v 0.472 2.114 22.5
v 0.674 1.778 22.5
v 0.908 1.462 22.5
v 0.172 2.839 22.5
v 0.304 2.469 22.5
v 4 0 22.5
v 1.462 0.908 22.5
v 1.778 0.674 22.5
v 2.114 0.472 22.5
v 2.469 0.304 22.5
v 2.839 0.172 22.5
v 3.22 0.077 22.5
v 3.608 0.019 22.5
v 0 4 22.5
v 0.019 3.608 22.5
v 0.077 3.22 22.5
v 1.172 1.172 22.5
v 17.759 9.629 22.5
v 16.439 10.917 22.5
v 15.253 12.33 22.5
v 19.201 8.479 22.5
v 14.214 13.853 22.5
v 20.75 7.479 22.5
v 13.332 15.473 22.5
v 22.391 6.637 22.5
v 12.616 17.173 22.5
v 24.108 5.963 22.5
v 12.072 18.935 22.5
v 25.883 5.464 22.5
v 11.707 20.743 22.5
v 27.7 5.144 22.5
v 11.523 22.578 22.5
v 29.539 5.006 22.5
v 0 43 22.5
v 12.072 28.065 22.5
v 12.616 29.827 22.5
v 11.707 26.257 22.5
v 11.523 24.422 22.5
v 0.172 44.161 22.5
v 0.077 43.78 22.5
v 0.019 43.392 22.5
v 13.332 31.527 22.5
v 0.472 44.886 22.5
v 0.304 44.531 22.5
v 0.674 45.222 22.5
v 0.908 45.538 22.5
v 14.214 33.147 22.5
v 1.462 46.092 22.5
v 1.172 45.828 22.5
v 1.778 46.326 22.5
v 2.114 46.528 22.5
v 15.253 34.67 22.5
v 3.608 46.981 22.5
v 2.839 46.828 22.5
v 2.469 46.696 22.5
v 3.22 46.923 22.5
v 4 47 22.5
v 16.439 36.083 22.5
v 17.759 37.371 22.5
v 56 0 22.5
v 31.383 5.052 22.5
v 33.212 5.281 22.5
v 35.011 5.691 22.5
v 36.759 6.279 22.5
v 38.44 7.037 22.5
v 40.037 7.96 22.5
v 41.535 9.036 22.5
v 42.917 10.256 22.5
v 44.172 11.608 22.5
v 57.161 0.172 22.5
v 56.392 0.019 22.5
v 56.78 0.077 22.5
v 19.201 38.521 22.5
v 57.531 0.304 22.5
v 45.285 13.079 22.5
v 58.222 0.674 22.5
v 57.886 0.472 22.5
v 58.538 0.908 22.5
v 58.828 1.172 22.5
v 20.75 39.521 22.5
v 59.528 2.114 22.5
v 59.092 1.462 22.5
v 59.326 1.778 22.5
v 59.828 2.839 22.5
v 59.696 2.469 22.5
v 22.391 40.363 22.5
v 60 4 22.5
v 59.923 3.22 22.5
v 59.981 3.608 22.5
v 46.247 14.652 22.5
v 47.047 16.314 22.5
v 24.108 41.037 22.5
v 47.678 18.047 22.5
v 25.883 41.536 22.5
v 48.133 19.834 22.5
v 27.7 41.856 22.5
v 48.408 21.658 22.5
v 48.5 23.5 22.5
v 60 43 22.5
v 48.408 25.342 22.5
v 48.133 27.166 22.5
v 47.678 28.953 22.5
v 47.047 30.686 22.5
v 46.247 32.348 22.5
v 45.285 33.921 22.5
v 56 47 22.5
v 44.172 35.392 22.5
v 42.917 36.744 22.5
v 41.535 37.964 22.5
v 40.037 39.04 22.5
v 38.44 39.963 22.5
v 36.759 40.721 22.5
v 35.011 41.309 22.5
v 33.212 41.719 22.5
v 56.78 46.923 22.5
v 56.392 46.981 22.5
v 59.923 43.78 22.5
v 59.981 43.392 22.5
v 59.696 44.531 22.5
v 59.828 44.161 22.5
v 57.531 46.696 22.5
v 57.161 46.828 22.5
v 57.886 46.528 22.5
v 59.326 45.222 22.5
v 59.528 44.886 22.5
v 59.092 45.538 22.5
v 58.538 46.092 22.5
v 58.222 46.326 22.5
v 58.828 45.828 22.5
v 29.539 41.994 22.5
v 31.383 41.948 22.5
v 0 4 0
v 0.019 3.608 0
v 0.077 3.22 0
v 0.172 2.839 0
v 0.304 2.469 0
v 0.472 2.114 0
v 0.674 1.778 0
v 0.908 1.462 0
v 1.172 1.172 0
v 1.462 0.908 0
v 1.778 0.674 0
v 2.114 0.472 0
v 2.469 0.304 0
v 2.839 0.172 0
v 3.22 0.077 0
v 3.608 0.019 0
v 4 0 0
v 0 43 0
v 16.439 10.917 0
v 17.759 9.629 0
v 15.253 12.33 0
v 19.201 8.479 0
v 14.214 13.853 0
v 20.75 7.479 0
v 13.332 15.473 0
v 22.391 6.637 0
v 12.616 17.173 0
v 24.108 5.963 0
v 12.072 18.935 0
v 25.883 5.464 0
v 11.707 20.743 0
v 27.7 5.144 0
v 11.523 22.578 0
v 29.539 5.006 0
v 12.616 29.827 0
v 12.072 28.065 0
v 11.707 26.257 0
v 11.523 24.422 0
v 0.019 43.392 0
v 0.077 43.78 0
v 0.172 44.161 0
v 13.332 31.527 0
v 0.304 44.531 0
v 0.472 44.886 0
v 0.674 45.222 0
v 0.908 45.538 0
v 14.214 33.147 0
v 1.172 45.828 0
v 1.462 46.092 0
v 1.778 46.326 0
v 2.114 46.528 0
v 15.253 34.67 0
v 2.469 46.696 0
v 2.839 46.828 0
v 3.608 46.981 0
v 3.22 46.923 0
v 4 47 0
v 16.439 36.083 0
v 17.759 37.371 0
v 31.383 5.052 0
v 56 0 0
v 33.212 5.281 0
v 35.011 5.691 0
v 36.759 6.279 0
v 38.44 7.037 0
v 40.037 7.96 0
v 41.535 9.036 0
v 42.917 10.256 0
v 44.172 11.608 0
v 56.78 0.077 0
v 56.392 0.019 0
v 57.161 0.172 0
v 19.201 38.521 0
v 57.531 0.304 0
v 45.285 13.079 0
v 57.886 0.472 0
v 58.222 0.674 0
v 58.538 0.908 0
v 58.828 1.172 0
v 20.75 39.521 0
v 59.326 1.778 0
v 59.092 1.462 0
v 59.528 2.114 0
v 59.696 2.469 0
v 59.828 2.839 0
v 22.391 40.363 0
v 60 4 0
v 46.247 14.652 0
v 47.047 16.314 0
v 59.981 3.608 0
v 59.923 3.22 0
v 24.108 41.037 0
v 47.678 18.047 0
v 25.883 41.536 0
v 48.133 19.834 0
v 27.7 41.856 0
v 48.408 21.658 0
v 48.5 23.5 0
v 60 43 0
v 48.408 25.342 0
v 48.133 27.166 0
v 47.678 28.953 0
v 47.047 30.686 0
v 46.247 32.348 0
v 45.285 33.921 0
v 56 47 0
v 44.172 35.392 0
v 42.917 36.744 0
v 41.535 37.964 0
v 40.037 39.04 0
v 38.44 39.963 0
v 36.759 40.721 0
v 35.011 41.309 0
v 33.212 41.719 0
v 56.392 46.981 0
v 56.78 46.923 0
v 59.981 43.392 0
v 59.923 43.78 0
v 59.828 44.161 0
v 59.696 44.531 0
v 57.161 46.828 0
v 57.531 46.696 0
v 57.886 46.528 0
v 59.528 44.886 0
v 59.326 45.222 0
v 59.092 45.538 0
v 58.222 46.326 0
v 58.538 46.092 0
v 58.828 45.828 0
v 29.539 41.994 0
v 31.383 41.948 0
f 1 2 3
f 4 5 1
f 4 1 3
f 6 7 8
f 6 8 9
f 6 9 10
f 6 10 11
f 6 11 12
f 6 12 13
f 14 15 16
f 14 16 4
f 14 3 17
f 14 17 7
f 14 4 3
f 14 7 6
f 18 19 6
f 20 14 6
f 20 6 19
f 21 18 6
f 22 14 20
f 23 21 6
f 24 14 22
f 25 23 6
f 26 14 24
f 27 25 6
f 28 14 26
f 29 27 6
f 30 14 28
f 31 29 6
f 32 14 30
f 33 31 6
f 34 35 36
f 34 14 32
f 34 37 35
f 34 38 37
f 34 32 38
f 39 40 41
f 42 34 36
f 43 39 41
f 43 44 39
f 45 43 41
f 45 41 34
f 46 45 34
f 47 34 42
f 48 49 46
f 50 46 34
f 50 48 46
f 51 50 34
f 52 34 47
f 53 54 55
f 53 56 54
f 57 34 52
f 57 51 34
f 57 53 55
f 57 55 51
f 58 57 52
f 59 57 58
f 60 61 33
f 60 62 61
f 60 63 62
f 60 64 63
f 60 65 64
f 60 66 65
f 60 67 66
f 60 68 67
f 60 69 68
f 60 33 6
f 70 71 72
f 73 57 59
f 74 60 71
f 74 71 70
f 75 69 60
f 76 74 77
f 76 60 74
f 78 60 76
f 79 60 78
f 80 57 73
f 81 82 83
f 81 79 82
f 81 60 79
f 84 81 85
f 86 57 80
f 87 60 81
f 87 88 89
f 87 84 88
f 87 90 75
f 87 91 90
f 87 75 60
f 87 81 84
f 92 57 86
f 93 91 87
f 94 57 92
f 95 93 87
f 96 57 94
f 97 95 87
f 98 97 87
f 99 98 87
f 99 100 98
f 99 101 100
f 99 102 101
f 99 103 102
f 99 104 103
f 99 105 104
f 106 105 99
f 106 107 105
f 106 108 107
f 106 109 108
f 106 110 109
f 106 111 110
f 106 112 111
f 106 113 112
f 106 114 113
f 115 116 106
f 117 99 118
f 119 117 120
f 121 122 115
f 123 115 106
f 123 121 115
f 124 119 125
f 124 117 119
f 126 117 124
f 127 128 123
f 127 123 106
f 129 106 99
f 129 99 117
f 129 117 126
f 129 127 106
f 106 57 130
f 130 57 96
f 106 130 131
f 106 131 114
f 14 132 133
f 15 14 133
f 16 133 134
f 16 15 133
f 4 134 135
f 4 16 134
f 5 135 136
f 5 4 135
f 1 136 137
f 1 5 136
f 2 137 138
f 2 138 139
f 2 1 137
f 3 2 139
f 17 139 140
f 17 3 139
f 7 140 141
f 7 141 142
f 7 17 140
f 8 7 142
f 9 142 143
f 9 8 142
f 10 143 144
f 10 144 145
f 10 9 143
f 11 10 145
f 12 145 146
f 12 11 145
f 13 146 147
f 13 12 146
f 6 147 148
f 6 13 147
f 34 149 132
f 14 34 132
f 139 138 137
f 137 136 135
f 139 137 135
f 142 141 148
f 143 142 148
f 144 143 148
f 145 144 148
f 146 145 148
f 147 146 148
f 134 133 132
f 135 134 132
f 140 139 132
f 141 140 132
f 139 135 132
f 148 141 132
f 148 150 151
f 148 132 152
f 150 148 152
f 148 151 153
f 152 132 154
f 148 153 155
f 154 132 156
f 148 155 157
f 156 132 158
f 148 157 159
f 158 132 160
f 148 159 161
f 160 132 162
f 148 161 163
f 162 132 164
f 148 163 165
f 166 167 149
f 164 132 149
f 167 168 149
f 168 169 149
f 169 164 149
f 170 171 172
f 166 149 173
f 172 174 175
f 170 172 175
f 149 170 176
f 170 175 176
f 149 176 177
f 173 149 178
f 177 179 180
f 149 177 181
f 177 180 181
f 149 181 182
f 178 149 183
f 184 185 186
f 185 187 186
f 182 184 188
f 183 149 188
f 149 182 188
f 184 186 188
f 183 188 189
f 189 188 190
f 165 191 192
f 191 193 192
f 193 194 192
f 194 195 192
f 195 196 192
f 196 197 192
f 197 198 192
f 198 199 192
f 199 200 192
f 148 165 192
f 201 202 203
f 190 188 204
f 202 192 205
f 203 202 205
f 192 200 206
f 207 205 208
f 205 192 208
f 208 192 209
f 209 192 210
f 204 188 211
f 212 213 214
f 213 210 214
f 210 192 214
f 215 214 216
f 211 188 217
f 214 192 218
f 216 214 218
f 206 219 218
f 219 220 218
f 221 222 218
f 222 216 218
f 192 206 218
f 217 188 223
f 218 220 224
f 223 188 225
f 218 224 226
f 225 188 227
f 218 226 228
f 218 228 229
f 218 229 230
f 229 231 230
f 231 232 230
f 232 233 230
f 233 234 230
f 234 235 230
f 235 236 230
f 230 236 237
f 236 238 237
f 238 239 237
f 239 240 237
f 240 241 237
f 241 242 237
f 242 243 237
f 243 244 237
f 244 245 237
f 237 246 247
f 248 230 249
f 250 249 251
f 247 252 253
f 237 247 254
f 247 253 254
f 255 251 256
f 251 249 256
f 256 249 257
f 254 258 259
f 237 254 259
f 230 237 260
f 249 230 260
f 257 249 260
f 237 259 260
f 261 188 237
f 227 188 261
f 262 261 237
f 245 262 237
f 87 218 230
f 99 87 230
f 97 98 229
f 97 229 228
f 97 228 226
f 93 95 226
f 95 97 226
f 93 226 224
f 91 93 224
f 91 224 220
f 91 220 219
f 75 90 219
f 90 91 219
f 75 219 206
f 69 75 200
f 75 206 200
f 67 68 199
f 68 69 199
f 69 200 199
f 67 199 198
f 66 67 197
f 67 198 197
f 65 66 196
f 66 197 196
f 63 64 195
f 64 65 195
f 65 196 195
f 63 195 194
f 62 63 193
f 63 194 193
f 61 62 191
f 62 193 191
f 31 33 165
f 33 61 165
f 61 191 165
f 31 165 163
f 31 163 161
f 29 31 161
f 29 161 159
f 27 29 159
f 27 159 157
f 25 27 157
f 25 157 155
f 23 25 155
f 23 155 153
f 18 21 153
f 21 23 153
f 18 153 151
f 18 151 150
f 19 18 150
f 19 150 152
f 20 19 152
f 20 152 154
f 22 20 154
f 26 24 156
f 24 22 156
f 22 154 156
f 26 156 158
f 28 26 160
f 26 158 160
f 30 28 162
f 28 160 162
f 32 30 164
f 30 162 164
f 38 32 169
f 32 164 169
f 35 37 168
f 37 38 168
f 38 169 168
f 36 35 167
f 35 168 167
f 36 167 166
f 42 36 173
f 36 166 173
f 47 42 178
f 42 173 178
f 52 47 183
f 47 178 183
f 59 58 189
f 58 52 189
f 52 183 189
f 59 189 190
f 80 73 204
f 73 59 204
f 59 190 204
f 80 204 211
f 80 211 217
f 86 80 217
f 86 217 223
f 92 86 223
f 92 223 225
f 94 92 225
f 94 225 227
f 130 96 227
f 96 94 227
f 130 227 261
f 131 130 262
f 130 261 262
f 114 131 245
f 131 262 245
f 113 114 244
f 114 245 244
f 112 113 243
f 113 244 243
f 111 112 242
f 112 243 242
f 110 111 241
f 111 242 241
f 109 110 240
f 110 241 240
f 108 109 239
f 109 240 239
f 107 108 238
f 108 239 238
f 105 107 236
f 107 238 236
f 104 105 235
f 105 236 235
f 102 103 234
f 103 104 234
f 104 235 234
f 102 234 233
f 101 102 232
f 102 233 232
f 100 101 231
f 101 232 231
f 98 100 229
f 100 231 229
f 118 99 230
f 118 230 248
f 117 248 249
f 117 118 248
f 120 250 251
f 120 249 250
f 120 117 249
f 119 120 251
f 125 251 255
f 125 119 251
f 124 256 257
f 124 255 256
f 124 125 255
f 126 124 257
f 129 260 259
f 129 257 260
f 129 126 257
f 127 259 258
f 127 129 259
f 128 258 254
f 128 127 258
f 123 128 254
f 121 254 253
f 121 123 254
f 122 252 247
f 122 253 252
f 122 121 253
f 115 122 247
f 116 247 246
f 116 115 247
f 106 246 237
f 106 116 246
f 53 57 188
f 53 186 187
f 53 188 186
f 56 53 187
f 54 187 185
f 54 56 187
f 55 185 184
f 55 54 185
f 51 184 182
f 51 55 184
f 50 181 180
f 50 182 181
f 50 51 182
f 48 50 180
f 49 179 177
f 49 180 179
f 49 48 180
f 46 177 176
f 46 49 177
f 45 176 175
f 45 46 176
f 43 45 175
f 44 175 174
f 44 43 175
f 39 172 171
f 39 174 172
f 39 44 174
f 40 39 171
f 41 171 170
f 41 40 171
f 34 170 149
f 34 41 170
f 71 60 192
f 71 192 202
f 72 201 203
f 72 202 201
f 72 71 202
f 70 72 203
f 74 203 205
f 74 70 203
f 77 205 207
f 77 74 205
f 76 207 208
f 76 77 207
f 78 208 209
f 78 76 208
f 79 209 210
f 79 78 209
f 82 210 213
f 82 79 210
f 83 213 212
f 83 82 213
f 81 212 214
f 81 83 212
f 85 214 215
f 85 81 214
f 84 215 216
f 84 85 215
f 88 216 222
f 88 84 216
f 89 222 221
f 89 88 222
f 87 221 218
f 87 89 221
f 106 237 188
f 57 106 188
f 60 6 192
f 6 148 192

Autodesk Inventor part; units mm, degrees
ref_plane "YZ Plane" through (0, 0, 0) normal (1, 0, 0) x (0, 1, 0)
ref_plane "XZ Plane" through (0, 0, 0) normal (0, 1, 0) x (-1, 0, 0)
ref_plane "XY Plane" through (0, 0, 0) normal (0, 0, 1) x (1, 0, 0)
sketch "Sketch1" plane through (0, 0, 0) normal (0, 0, 1) x (1, 0, 0)
  line L0 (0, 0) -> (60, 0)
  line L1 (60, 0) -> (60, 47)
  line L2 (60, 47) -> (0, 47)
  line L3 (0, 47) -> (0, 0)
  circle A0 centre (30, 23.5) radius 18.5
  line L4 (11.5, 42) -> (48.5, 42) construction
  line L5 (48.5, 42) -> (48.5, 5) construction
  line L6 (48.5, 5) -> (11.5, 5) construction
  line L7 (11.5, 5) -> (11.5, 42) construction
  point P0 (60, 23.5)
  point P1 (30, 47)
  dimension "d0" = 37
  dimension "d1" = 5
  dimension "d5" = 60
extrude "Extrusion1" add sketch "Sketch1" along normal blind 22.5
fillet "Fillet1" radius 4 4 edges at (60, 47, 11.25) (60, 0, 11.25) (0, 0, 11.25) (0, 47, 11.25)
properties part number "Gearbox Mount"
